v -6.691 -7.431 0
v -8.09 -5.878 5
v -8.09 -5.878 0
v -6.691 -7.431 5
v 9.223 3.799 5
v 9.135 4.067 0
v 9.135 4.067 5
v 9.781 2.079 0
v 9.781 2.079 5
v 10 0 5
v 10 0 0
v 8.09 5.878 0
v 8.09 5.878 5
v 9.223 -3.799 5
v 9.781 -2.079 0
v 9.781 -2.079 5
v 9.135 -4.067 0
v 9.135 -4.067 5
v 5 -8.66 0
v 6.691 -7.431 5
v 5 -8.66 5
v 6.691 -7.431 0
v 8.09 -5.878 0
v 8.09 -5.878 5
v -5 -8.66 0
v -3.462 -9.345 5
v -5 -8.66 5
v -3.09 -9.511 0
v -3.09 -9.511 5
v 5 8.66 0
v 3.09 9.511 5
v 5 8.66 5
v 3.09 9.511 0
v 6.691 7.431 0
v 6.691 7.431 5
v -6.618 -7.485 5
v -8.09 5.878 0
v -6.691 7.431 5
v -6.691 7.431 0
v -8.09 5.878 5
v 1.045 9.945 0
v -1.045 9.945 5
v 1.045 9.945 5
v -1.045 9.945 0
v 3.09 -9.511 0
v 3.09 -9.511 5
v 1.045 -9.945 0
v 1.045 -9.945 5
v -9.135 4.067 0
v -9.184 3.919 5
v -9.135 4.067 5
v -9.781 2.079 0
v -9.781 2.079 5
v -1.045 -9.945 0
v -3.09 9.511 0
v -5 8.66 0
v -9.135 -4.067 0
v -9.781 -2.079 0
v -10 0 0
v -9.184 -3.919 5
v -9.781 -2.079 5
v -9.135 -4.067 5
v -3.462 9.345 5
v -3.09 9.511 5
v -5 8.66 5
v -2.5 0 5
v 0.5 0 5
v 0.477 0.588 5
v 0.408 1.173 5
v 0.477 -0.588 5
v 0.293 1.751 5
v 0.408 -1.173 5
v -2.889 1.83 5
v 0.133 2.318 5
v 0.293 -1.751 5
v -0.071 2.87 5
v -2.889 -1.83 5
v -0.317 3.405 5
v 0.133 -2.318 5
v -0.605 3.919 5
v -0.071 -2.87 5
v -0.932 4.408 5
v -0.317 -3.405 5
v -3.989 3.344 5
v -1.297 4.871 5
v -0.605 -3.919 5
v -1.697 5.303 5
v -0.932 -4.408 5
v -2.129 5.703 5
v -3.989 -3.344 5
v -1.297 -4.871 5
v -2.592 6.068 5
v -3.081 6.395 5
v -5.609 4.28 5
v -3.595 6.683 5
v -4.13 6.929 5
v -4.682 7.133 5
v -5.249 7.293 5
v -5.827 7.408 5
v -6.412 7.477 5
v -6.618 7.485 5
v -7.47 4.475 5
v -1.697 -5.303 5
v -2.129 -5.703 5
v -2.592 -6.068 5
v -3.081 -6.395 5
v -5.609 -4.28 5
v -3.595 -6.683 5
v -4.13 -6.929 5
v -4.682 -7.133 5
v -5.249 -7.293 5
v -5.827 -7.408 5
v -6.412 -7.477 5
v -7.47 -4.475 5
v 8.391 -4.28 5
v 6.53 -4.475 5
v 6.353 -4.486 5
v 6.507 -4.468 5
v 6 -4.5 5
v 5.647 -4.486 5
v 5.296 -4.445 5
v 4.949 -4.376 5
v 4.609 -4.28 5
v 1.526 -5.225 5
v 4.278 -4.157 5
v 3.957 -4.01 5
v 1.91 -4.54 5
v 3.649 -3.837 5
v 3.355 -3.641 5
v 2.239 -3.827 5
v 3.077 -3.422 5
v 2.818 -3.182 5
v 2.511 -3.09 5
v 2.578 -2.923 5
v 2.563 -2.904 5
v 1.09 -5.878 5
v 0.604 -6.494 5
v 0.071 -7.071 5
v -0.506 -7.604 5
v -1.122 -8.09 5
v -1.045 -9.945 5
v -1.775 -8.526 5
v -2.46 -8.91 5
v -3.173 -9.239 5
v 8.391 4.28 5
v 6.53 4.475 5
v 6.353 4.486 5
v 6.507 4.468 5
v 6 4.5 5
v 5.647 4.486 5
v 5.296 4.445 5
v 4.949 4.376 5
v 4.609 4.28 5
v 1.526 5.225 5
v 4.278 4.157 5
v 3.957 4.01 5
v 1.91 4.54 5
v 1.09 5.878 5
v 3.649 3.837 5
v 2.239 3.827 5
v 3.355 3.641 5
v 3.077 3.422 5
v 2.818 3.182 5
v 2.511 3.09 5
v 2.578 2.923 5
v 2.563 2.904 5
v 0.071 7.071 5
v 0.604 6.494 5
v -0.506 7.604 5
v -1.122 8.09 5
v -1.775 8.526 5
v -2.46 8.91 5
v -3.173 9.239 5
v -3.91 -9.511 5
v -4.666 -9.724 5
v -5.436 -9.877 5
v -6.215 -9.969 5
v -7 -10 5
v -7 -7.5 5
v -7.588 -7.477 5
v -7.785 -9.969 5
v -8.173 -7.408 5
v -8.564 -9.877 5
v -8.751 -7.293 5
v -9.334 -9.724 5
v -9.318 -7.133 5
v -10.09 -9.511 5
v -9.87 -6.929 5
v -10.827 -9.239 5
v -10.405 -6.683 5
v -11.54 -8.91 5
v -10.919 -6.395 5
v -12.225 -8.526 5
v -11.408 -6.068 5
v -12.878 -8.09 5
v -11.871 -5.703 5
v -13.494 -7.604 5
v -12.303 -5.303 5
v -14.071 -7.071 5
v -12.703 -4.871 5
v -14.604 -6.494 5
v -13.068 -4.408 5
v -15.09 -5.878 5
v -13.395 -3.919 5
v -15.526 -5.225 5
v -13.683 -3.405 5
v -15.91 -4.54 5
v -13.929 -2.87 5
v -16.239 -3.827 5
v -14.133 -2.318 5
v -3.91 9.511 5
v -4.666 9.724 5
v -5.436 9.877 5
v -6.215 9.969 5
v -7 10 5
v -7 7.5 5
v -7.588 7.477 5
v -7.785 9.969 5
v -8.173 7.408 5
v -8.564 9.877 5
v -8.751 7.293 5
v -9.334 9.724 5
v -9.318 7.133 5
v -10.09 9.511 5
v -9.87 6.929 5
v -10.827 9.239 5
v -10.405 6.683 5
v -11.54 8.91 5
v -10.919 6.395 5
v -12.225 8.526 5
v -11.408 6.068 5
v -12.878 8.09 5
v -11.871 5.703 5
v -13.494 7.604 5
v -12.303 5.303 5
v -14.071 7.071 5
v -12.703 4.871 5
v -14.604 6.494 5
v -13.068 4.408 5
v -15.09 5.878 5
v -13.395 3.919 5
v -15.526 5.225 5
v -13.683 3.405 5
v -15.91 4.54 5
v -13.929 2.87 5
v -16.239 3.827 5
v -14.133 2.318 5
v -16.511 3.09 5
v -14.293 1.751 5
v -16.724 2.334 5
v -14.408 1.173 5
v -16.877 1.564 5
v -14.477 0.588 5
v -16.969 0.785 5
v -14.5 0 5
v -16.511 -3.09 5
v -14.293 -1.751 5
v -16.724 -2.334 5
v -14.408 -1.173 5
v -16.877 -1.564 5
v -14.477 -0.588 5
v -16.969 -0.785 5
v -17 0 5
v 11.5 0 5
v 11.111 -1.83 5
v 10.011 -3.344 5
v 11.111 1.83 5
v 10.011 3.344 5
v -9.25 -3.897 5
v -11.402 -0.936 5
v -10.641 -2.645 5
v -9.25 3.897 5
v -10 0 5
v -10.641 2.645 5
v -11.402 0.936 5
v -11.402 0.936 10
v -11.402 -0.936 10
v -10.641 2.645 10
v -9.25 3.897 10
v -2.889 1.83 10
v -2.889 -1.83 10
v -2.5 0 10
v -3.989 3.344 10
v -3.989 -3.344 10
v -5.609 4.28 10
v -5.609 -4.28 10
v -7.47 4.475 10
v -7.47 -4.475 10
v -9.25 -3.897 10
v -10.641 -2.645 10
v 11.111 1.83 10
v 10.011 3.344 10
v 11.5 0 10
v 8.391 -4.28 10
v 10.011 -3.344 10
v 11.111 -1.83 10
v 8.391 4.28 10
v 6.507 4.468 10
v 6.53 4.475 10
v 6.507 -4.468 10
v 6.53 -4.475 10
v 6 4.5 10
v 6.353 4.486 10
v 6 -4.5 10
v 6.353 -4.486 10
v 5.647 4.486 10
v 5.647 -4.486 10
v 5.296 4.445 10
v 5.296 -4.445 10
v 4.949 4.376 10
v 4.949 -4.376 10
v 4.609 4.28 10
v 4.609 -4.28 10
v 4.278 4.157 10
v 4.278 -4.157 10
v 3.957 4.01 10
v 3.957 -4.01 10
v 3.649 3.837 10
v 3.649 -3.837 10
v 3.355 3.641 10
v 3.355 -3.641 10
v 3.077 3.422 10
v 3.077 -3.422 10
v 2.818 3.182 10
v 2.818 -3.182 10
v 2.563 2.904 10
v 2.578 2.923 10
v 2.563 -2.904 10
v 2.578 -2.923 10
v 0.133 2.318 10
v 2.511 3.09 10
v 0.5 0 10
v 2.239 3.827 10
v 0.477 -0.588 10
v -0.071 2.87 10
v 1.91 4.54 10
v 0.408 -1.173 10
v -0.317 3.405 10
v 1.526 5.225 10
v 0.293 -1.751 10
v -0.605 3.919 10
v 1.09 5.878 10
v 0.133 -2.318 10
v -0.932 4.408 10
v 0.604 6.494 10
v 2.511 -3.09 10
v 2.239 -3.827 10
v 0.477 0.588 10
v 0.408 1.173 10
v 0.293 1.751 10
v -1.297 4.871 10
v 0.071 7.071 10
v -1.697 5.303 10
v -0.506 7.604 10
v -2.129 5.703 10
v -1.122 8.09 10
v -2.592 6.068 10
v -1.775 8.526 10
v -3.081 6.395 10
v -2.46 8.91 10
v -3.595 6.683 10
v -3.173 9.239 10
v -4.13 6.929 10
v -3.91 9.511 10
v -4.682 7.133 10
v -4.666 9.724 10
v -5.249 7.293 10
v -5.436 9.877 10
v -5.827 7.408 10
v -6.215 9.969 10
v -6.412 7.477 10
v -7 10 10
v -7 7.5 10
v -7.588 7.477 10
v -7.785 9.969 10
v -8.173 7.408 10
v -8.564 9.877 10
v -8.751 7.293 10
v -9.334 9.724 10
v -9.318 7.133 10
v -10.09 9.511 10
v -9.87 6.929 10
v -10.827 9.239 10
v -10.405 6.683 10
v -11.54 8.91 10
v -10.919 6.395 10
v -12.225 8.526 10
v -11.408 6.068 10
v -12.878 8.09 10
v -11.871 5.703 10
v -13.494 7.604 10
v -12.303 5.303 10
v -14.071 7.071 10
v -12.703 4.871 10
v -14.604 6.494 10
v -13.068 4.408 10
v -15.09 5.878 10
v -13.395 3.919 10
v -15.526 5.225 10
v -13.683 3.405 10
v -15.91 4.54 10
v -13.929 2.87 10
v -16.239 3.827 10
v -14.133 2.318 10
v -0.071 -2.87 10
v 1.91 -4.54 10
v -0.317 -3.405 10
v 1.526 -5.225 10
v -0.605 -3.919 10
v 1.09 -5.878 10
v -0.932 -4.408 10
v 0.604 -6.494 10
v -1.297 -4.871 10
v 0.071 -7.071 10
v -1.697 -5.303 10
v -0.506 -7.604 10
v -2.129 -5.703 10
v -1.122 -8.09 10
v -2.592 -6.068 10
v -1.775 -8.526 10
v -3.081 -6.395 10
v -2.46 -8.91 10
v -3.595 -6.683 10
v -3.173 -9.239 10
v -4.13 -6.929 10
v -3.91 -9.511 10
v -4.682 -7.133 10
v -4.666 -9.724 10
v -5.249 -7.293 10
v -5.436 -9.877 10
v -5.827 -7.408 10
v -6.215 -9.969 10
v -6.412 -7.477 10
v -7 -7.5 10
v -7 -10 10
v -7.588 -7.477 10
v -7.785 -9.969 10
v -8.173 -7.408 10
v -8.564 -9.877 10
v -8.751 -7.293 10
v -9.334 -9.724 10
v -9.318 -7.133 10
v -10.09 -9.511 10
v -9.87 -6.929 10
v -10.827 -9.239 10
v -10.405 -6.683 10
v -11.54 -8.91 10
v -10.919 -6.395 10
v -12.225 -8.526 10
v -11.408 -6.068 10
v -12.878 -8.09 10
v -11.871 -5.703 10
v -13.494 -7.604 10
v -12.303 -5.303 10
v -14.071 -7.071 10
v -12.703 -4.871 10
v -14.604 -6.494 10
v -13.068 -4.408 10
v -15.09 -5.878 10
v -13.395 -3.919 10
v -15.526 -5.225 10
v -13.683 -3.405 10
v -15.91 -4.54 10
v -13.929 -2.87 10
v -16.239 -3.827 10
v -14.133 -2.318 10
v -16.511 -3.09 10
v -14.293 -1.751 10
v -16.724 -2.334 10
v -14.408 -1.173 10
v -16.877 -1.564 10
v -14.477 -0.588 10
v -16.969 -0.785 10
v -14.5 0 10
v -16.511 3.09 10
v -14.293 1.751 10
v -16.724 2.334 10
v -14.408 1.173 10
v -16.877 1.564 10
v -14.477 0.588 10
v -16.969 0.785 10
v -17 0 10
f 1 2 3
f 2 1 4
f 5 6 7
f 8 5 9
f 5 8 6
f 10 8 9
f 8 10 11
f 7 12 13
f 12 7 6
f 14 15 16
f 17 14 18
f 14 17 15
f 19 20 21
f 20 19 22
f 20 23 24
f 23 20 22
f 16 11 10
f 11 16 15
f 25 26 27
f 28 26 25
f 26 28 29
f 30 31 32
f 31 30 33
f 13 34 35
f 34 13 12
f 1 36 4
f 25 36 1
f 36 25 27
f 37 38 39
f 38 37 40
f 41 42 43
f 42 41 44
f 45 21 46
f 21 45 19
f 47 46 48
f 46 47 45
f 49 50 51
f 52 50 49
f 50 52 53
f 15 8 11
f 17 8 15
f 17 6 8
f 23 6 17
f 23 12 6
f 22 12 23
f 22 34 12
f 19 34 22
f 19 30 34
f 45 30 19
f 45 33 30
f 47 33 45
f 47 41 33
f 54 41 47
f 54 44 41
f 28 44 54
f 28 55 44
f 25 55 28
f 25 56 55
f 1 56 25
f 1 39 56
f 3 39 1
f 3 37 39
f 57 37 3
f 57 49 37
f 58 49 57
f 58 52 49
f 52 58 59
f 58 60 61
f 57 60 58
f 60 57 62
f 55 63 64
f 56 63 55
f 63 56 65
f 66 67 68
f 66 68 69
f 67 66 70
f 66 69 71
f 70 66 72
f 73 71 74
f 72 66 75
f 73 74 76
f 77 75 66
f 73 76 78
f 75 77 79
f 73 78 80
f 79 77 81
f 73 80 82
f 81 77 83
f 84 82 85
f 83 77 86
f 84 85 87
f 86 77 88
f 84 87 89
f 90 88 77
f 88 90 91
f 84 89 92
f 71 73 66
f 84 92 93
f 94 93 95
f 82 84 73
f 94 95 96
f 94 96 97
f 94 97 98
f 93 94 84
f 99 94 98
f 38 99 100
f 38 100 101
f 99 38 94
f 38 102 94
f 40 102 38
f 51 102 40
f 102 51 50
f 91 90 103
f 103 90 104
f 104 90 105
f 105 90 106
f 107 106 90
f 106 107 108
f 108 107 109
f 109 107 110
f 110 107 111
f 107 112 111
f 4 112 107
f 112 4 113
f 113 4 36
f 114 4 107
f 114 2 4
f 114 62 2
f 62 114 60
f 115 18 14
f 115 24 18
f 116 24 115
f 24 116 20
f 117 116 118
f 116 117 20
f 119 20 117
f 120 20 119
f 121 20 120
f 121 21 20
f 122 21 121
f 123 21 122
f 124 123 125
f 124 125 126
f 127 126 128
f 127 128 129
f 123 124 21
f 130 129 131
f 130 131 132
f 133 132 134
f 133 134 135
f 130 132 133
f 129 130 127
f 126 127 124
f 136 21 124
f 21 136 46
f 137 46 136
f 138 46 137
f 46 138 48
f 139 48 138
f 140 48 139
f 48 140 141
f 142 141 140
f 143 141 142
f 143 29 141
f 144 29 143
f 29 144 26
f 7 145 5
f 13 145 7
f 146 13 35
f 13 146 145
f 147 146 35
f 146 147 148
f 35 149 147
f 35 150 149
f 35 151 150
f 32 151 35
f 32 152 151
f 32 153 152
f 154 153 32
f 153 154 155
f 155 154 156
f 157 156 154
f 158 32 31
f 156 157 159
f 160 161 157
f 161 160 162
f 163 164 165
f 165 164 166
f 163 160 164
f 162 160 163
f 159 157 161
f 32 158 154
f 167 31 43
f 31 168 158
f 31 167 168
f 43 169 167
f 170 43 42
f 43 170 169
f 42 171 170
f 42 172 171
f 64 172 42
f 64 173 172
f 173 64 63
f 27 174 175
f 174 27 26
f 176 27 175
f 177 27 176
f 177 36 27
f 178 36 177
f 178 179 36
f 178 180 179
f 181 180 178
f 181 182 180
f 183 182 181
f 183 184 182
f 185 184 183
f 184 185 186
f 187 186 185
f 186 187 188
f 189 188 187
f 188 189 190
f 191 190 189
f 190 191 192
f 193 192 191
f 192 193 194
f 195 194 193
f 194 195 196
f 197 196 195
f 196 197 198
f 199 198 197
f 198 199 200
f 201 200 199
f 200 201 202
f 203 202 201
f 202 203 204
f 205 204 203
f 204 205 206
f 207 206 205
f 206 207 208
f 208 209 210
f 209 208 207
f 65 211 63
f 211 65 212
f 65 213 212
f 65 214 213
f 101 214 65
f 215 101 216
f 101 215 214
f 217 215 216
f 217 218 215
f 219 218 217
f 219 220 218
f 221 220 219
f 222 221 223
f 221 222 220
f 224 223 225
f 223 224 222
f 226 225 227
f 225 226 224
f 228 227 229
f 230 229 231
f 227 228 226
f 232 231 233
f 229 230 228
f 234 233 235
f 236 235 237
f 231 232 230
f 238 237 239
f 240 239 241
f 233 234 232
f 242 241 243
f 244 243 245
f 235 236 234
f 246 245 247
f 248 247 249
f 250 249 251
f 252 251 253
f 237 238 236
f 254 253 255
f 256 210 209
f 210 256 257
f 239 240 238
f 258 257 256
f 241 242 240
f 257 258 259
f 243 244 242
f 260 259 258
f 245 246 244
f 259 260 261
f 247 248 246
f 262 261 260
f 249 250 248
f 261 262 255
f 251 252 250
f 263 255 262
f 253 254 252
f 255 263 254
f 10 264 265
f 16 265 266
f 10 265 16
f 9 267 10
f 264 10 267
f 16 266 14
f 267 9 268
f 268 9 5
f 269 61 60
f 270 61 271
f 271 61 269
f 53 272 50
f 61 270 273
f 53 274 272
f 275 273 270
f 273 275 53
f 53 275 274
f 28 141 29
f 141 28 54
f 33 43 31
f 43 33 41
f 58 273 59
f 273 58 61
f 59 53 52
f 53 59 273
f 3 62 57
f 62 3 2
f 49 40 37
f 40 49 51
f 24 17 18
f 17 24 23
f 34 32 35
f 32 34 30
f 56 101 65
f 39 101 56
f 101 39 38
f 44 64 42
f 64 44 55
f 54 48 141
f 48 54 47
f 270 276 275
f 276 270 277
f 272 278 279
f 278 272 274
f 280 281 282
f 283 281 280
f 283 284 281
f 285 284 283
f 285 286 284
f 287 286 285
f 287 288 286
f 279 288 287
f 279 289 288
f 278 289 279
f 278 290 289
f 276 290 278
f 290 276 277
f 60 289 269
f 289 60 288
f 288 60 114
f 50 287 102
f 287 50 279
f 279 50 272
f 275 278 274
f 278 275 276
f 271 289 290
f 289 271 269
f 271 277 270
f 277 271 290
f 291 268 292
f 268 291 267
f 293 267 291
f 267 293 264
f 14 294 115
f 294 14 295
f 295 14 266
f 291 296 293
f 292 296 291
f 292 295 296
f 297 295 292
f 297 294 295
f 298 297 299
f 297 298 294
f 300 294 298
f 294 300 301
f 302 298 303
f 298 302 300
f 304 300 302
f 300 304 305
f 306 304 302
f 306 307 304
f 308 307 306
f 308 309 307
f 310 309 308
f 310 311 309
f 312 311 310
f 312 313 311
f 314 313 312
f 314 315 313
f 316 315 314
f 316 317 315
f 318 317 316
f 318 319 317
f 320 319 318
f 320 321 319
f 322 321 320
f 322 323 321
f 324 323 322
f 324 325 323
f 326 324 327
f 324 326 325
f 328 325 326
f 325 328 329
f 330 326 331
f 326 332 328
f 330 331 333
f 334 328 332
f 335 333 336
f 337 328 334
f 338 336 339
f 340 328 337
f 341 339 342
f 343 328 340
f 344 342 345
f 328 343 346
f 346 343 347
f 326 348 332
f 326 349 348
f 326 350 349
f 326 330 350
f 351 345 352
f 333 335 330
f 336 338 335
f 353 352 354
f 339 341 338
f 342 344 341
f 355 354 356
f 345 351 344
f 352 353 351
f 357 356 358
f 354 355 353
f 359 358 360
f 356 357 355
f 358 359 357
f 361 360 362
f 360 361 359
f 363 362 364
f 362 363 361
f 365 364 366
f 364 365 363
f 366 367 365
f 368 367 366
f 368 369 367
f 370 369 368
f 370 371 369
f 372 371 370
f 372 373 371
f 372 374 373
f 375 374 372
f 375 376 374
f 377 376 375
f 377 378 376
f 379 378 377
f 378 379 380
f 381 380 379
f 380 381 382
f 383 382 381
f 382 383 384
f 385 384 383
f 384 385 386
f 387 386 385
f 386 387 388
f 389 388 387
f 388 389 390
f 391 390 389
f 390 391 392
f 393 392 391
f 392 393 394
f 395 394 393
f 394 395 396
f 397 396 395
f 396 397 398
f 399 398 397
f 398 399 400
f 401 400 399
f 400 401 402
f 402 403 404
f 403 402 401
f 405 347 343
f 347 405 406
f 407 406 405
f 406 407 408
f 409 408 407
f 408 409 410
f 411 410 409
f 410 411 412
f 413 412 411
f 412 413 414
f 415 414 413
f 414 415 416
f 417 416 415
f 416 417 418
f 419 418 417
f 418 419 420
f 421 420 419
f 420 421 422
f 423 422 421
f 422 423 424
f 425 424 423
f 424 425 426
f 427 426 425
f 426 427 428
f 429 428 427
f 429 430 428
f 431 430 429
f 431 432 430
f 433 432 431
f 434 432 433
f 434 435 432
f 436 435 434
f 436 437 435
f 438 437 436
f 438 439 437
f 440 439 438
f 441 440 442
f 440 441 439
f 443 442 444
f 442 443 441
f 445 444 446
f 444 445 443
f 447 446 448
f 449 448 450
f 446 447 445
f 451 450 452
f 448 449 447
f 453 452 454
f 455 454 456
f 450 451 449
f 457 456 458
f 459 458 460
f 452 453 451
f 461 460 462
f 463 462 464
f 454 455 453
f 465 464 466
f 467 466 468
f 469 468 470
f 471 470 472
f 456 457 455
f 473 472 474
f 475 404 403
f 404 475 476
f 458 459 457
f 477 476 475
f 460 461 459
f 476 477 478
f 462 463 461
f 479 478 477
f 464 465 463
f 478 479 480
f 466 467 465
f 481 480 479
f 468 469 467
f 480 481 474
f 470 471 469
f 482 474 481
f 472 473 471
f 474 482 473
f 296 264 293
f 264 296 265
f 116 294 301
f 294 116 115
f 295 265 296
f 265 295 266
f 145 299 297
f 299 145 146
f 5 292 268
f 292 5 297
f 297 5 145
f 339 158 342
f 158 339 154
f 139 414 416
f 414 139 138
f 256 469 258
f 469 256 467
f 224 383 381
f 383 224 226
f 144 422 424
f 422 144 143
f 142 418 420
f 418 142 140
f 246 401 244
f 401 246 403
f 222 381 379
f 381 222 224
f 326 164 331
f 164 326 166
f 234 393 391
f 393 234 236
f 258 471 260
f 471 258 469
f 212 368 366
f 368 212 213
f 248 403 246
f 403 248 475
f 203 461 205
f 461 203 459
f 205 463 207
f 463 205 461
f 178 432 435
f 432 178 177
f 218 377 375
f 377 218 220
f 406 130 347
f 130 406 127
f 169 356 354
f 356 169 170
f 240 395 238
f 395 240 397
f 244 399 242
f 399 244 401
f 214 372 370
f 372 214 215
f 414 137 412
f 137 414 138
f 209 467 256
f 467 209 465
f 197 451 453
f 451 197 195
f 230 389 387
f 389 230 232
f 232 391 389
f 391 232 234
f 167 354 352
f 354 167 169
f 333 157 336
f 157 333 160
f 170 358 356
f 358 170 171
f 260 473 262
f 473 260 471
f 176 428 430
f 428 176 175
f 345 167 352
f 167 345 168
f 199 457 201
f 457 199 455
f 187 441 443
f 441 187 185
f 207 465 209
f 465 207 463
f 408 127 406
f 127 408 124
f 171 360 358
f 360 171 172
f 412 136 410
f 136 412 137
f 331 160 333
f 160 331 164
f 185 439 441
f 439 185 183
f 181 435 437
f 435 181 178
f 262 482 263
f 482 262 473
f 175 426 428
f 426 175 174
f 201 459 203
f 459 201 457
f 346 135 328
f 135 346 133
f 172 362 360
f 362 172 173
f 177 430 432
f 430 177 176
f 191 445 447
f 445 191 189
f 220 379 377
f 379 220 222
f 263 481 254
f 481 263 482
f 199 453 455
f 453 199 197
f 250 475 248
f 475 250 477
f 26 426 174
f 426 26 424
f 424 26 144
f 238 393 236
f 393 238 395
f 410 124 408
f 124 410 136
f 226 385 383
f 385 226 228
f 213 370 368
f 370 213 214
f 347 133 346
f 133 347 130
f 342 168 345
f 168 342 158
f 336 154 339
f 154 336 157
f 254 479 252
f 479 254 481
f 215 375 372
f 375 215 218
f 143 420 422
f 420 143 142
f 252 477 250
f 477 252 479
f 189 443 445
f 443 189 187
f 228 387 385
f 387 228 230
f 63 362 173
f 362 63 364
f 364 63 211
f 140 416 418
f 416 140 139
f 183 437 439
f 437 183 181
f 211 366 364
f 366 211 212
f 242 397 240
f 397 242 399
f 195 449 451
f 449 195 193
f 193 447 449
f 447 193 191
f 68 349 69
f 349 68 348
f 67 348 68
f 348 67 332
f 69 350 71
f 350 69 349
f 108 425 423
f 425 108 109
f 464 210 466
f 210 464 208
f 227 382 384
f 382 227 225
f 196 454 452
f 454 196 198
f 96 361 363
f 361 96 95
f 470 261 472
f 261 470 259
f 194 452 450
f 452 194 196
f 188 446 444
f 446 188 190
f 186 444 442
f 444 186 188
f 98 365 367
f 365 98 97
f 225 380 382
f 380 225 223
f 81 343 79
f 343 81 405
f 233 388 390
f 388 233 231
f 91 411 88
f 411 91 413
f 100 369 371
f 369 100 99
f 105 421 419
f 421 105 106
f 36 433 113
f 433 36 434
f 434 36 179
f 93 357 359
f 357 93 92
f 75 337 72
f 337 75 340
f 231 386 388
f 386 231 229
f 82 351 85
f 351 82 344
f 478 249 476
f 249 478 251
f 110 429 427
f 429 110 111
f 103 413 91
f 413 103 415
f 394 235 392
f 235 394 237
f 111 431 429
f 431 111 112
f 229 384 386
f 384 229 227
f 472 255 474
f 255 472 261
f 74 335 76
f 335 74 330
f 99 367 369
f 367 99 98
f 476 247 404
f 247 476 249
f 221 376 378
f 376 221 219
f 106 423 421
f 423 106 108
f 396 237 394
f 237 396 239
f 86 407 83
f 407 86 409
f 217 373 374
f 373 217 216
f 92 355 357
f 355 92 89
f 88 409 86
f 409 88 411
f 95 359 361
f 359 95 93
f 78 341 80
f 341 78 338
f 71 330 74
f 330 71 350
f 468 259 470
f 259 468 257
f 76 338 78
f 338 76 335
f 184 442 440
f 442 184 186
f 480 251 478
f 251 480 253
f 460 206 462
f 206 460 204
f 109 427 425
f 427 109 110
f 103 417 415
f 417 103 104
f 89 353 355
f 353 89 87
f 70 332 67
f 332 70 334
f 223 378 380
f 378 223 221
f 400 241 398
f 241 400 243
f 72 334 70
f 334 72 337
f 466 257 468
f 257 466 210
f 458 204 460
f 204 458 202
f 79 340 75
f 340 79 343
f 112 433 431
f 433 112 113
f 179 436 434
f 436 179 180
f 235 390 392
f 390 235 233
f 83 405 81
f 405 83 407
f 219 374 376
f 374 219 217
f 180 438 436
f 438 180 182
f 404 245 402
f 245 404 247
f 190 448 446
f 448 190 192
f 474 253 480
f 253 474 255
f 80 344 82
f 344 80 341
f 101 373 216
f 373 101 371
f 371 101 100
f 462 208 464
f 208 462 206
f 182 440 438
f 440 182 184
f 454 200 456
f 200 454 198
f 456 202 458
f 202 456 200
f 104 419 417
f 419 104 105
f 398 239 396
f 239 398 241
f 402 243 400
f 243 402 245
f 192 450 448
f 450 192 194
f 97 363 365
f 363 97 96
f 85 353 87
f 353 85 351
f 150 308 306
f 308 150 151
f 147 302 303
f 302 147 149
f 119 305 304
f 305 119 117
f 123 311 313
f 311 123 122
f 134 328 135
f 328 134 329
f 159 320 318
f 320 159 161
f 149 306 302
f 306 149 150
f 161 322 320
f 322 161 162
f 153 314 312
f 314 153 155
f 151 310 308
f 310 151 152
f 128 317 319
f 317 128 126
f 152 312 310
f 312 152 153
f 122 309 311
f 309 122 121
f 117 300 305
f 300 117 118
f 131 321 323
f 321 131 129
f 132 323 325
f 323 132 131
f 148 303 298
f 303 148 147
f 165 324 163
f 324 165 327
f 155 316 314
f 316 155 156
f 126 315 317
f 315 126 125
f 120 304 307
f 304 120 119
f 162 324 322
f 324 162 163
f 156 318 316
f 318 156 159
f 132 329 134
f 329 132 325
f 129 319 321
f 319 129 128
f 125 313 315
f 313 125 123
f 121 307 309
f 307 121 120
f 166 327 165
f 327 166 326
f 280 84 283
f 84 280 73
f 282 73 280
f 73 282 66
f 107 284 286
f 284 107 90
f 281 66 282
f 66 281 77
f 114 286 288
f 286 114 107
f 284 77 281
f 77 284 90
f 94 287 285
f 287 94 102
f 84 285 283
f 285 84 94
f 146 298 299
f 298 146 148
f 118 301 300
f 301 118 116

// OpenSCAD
//Making a plain cylinder loop.
cylinder(h = 5, d = 20);

//making it thicker.
difference() {
    cylinder(h = 5, d = 20);
    cylinder(h = 5, d = 16);
}

//two cylinders but not touching. 
//AI didn't get it right.

translate([-7, 0, 5])
cylinder(h = 5, d = 9);

translate([7, 0, 5])
cylinder(h = 5, d = 9);

//two hollow cylinders but not touching.

translate([-7, 0, 5])
difference() {
    cylinder(h = 5, d = 9);
    cylinder(h = 5, d = 5);
}

translate([7, 0, 5])
difference() {
    cylinder(h = 5, d = 9);
    cylinder(h = 5, d = 5);
}

//two hollow cylinders touching 80 segments (will need to be 360 eventually)

translate([-7, 0, 5])
difference() {
    cylinder($fn = 80,
           $fa = 12,
           $fs = 2,
           h = 5, 
           d = 20);
    cylinder($fn = 80,
           $fa = 12,
           $fs = 2,
           h = 5, 
           d = 15);
}

translate([6, 0, 5])
difference() {
    cylinder($fn = 80,
           $fa = 12,
           $fs = 2,
           h = 5, 
           d = 9);
    cylinder($fn = 80,
           $fa = 12,
           $fs = 2,
           h = 5, 
           d = 5);
}
